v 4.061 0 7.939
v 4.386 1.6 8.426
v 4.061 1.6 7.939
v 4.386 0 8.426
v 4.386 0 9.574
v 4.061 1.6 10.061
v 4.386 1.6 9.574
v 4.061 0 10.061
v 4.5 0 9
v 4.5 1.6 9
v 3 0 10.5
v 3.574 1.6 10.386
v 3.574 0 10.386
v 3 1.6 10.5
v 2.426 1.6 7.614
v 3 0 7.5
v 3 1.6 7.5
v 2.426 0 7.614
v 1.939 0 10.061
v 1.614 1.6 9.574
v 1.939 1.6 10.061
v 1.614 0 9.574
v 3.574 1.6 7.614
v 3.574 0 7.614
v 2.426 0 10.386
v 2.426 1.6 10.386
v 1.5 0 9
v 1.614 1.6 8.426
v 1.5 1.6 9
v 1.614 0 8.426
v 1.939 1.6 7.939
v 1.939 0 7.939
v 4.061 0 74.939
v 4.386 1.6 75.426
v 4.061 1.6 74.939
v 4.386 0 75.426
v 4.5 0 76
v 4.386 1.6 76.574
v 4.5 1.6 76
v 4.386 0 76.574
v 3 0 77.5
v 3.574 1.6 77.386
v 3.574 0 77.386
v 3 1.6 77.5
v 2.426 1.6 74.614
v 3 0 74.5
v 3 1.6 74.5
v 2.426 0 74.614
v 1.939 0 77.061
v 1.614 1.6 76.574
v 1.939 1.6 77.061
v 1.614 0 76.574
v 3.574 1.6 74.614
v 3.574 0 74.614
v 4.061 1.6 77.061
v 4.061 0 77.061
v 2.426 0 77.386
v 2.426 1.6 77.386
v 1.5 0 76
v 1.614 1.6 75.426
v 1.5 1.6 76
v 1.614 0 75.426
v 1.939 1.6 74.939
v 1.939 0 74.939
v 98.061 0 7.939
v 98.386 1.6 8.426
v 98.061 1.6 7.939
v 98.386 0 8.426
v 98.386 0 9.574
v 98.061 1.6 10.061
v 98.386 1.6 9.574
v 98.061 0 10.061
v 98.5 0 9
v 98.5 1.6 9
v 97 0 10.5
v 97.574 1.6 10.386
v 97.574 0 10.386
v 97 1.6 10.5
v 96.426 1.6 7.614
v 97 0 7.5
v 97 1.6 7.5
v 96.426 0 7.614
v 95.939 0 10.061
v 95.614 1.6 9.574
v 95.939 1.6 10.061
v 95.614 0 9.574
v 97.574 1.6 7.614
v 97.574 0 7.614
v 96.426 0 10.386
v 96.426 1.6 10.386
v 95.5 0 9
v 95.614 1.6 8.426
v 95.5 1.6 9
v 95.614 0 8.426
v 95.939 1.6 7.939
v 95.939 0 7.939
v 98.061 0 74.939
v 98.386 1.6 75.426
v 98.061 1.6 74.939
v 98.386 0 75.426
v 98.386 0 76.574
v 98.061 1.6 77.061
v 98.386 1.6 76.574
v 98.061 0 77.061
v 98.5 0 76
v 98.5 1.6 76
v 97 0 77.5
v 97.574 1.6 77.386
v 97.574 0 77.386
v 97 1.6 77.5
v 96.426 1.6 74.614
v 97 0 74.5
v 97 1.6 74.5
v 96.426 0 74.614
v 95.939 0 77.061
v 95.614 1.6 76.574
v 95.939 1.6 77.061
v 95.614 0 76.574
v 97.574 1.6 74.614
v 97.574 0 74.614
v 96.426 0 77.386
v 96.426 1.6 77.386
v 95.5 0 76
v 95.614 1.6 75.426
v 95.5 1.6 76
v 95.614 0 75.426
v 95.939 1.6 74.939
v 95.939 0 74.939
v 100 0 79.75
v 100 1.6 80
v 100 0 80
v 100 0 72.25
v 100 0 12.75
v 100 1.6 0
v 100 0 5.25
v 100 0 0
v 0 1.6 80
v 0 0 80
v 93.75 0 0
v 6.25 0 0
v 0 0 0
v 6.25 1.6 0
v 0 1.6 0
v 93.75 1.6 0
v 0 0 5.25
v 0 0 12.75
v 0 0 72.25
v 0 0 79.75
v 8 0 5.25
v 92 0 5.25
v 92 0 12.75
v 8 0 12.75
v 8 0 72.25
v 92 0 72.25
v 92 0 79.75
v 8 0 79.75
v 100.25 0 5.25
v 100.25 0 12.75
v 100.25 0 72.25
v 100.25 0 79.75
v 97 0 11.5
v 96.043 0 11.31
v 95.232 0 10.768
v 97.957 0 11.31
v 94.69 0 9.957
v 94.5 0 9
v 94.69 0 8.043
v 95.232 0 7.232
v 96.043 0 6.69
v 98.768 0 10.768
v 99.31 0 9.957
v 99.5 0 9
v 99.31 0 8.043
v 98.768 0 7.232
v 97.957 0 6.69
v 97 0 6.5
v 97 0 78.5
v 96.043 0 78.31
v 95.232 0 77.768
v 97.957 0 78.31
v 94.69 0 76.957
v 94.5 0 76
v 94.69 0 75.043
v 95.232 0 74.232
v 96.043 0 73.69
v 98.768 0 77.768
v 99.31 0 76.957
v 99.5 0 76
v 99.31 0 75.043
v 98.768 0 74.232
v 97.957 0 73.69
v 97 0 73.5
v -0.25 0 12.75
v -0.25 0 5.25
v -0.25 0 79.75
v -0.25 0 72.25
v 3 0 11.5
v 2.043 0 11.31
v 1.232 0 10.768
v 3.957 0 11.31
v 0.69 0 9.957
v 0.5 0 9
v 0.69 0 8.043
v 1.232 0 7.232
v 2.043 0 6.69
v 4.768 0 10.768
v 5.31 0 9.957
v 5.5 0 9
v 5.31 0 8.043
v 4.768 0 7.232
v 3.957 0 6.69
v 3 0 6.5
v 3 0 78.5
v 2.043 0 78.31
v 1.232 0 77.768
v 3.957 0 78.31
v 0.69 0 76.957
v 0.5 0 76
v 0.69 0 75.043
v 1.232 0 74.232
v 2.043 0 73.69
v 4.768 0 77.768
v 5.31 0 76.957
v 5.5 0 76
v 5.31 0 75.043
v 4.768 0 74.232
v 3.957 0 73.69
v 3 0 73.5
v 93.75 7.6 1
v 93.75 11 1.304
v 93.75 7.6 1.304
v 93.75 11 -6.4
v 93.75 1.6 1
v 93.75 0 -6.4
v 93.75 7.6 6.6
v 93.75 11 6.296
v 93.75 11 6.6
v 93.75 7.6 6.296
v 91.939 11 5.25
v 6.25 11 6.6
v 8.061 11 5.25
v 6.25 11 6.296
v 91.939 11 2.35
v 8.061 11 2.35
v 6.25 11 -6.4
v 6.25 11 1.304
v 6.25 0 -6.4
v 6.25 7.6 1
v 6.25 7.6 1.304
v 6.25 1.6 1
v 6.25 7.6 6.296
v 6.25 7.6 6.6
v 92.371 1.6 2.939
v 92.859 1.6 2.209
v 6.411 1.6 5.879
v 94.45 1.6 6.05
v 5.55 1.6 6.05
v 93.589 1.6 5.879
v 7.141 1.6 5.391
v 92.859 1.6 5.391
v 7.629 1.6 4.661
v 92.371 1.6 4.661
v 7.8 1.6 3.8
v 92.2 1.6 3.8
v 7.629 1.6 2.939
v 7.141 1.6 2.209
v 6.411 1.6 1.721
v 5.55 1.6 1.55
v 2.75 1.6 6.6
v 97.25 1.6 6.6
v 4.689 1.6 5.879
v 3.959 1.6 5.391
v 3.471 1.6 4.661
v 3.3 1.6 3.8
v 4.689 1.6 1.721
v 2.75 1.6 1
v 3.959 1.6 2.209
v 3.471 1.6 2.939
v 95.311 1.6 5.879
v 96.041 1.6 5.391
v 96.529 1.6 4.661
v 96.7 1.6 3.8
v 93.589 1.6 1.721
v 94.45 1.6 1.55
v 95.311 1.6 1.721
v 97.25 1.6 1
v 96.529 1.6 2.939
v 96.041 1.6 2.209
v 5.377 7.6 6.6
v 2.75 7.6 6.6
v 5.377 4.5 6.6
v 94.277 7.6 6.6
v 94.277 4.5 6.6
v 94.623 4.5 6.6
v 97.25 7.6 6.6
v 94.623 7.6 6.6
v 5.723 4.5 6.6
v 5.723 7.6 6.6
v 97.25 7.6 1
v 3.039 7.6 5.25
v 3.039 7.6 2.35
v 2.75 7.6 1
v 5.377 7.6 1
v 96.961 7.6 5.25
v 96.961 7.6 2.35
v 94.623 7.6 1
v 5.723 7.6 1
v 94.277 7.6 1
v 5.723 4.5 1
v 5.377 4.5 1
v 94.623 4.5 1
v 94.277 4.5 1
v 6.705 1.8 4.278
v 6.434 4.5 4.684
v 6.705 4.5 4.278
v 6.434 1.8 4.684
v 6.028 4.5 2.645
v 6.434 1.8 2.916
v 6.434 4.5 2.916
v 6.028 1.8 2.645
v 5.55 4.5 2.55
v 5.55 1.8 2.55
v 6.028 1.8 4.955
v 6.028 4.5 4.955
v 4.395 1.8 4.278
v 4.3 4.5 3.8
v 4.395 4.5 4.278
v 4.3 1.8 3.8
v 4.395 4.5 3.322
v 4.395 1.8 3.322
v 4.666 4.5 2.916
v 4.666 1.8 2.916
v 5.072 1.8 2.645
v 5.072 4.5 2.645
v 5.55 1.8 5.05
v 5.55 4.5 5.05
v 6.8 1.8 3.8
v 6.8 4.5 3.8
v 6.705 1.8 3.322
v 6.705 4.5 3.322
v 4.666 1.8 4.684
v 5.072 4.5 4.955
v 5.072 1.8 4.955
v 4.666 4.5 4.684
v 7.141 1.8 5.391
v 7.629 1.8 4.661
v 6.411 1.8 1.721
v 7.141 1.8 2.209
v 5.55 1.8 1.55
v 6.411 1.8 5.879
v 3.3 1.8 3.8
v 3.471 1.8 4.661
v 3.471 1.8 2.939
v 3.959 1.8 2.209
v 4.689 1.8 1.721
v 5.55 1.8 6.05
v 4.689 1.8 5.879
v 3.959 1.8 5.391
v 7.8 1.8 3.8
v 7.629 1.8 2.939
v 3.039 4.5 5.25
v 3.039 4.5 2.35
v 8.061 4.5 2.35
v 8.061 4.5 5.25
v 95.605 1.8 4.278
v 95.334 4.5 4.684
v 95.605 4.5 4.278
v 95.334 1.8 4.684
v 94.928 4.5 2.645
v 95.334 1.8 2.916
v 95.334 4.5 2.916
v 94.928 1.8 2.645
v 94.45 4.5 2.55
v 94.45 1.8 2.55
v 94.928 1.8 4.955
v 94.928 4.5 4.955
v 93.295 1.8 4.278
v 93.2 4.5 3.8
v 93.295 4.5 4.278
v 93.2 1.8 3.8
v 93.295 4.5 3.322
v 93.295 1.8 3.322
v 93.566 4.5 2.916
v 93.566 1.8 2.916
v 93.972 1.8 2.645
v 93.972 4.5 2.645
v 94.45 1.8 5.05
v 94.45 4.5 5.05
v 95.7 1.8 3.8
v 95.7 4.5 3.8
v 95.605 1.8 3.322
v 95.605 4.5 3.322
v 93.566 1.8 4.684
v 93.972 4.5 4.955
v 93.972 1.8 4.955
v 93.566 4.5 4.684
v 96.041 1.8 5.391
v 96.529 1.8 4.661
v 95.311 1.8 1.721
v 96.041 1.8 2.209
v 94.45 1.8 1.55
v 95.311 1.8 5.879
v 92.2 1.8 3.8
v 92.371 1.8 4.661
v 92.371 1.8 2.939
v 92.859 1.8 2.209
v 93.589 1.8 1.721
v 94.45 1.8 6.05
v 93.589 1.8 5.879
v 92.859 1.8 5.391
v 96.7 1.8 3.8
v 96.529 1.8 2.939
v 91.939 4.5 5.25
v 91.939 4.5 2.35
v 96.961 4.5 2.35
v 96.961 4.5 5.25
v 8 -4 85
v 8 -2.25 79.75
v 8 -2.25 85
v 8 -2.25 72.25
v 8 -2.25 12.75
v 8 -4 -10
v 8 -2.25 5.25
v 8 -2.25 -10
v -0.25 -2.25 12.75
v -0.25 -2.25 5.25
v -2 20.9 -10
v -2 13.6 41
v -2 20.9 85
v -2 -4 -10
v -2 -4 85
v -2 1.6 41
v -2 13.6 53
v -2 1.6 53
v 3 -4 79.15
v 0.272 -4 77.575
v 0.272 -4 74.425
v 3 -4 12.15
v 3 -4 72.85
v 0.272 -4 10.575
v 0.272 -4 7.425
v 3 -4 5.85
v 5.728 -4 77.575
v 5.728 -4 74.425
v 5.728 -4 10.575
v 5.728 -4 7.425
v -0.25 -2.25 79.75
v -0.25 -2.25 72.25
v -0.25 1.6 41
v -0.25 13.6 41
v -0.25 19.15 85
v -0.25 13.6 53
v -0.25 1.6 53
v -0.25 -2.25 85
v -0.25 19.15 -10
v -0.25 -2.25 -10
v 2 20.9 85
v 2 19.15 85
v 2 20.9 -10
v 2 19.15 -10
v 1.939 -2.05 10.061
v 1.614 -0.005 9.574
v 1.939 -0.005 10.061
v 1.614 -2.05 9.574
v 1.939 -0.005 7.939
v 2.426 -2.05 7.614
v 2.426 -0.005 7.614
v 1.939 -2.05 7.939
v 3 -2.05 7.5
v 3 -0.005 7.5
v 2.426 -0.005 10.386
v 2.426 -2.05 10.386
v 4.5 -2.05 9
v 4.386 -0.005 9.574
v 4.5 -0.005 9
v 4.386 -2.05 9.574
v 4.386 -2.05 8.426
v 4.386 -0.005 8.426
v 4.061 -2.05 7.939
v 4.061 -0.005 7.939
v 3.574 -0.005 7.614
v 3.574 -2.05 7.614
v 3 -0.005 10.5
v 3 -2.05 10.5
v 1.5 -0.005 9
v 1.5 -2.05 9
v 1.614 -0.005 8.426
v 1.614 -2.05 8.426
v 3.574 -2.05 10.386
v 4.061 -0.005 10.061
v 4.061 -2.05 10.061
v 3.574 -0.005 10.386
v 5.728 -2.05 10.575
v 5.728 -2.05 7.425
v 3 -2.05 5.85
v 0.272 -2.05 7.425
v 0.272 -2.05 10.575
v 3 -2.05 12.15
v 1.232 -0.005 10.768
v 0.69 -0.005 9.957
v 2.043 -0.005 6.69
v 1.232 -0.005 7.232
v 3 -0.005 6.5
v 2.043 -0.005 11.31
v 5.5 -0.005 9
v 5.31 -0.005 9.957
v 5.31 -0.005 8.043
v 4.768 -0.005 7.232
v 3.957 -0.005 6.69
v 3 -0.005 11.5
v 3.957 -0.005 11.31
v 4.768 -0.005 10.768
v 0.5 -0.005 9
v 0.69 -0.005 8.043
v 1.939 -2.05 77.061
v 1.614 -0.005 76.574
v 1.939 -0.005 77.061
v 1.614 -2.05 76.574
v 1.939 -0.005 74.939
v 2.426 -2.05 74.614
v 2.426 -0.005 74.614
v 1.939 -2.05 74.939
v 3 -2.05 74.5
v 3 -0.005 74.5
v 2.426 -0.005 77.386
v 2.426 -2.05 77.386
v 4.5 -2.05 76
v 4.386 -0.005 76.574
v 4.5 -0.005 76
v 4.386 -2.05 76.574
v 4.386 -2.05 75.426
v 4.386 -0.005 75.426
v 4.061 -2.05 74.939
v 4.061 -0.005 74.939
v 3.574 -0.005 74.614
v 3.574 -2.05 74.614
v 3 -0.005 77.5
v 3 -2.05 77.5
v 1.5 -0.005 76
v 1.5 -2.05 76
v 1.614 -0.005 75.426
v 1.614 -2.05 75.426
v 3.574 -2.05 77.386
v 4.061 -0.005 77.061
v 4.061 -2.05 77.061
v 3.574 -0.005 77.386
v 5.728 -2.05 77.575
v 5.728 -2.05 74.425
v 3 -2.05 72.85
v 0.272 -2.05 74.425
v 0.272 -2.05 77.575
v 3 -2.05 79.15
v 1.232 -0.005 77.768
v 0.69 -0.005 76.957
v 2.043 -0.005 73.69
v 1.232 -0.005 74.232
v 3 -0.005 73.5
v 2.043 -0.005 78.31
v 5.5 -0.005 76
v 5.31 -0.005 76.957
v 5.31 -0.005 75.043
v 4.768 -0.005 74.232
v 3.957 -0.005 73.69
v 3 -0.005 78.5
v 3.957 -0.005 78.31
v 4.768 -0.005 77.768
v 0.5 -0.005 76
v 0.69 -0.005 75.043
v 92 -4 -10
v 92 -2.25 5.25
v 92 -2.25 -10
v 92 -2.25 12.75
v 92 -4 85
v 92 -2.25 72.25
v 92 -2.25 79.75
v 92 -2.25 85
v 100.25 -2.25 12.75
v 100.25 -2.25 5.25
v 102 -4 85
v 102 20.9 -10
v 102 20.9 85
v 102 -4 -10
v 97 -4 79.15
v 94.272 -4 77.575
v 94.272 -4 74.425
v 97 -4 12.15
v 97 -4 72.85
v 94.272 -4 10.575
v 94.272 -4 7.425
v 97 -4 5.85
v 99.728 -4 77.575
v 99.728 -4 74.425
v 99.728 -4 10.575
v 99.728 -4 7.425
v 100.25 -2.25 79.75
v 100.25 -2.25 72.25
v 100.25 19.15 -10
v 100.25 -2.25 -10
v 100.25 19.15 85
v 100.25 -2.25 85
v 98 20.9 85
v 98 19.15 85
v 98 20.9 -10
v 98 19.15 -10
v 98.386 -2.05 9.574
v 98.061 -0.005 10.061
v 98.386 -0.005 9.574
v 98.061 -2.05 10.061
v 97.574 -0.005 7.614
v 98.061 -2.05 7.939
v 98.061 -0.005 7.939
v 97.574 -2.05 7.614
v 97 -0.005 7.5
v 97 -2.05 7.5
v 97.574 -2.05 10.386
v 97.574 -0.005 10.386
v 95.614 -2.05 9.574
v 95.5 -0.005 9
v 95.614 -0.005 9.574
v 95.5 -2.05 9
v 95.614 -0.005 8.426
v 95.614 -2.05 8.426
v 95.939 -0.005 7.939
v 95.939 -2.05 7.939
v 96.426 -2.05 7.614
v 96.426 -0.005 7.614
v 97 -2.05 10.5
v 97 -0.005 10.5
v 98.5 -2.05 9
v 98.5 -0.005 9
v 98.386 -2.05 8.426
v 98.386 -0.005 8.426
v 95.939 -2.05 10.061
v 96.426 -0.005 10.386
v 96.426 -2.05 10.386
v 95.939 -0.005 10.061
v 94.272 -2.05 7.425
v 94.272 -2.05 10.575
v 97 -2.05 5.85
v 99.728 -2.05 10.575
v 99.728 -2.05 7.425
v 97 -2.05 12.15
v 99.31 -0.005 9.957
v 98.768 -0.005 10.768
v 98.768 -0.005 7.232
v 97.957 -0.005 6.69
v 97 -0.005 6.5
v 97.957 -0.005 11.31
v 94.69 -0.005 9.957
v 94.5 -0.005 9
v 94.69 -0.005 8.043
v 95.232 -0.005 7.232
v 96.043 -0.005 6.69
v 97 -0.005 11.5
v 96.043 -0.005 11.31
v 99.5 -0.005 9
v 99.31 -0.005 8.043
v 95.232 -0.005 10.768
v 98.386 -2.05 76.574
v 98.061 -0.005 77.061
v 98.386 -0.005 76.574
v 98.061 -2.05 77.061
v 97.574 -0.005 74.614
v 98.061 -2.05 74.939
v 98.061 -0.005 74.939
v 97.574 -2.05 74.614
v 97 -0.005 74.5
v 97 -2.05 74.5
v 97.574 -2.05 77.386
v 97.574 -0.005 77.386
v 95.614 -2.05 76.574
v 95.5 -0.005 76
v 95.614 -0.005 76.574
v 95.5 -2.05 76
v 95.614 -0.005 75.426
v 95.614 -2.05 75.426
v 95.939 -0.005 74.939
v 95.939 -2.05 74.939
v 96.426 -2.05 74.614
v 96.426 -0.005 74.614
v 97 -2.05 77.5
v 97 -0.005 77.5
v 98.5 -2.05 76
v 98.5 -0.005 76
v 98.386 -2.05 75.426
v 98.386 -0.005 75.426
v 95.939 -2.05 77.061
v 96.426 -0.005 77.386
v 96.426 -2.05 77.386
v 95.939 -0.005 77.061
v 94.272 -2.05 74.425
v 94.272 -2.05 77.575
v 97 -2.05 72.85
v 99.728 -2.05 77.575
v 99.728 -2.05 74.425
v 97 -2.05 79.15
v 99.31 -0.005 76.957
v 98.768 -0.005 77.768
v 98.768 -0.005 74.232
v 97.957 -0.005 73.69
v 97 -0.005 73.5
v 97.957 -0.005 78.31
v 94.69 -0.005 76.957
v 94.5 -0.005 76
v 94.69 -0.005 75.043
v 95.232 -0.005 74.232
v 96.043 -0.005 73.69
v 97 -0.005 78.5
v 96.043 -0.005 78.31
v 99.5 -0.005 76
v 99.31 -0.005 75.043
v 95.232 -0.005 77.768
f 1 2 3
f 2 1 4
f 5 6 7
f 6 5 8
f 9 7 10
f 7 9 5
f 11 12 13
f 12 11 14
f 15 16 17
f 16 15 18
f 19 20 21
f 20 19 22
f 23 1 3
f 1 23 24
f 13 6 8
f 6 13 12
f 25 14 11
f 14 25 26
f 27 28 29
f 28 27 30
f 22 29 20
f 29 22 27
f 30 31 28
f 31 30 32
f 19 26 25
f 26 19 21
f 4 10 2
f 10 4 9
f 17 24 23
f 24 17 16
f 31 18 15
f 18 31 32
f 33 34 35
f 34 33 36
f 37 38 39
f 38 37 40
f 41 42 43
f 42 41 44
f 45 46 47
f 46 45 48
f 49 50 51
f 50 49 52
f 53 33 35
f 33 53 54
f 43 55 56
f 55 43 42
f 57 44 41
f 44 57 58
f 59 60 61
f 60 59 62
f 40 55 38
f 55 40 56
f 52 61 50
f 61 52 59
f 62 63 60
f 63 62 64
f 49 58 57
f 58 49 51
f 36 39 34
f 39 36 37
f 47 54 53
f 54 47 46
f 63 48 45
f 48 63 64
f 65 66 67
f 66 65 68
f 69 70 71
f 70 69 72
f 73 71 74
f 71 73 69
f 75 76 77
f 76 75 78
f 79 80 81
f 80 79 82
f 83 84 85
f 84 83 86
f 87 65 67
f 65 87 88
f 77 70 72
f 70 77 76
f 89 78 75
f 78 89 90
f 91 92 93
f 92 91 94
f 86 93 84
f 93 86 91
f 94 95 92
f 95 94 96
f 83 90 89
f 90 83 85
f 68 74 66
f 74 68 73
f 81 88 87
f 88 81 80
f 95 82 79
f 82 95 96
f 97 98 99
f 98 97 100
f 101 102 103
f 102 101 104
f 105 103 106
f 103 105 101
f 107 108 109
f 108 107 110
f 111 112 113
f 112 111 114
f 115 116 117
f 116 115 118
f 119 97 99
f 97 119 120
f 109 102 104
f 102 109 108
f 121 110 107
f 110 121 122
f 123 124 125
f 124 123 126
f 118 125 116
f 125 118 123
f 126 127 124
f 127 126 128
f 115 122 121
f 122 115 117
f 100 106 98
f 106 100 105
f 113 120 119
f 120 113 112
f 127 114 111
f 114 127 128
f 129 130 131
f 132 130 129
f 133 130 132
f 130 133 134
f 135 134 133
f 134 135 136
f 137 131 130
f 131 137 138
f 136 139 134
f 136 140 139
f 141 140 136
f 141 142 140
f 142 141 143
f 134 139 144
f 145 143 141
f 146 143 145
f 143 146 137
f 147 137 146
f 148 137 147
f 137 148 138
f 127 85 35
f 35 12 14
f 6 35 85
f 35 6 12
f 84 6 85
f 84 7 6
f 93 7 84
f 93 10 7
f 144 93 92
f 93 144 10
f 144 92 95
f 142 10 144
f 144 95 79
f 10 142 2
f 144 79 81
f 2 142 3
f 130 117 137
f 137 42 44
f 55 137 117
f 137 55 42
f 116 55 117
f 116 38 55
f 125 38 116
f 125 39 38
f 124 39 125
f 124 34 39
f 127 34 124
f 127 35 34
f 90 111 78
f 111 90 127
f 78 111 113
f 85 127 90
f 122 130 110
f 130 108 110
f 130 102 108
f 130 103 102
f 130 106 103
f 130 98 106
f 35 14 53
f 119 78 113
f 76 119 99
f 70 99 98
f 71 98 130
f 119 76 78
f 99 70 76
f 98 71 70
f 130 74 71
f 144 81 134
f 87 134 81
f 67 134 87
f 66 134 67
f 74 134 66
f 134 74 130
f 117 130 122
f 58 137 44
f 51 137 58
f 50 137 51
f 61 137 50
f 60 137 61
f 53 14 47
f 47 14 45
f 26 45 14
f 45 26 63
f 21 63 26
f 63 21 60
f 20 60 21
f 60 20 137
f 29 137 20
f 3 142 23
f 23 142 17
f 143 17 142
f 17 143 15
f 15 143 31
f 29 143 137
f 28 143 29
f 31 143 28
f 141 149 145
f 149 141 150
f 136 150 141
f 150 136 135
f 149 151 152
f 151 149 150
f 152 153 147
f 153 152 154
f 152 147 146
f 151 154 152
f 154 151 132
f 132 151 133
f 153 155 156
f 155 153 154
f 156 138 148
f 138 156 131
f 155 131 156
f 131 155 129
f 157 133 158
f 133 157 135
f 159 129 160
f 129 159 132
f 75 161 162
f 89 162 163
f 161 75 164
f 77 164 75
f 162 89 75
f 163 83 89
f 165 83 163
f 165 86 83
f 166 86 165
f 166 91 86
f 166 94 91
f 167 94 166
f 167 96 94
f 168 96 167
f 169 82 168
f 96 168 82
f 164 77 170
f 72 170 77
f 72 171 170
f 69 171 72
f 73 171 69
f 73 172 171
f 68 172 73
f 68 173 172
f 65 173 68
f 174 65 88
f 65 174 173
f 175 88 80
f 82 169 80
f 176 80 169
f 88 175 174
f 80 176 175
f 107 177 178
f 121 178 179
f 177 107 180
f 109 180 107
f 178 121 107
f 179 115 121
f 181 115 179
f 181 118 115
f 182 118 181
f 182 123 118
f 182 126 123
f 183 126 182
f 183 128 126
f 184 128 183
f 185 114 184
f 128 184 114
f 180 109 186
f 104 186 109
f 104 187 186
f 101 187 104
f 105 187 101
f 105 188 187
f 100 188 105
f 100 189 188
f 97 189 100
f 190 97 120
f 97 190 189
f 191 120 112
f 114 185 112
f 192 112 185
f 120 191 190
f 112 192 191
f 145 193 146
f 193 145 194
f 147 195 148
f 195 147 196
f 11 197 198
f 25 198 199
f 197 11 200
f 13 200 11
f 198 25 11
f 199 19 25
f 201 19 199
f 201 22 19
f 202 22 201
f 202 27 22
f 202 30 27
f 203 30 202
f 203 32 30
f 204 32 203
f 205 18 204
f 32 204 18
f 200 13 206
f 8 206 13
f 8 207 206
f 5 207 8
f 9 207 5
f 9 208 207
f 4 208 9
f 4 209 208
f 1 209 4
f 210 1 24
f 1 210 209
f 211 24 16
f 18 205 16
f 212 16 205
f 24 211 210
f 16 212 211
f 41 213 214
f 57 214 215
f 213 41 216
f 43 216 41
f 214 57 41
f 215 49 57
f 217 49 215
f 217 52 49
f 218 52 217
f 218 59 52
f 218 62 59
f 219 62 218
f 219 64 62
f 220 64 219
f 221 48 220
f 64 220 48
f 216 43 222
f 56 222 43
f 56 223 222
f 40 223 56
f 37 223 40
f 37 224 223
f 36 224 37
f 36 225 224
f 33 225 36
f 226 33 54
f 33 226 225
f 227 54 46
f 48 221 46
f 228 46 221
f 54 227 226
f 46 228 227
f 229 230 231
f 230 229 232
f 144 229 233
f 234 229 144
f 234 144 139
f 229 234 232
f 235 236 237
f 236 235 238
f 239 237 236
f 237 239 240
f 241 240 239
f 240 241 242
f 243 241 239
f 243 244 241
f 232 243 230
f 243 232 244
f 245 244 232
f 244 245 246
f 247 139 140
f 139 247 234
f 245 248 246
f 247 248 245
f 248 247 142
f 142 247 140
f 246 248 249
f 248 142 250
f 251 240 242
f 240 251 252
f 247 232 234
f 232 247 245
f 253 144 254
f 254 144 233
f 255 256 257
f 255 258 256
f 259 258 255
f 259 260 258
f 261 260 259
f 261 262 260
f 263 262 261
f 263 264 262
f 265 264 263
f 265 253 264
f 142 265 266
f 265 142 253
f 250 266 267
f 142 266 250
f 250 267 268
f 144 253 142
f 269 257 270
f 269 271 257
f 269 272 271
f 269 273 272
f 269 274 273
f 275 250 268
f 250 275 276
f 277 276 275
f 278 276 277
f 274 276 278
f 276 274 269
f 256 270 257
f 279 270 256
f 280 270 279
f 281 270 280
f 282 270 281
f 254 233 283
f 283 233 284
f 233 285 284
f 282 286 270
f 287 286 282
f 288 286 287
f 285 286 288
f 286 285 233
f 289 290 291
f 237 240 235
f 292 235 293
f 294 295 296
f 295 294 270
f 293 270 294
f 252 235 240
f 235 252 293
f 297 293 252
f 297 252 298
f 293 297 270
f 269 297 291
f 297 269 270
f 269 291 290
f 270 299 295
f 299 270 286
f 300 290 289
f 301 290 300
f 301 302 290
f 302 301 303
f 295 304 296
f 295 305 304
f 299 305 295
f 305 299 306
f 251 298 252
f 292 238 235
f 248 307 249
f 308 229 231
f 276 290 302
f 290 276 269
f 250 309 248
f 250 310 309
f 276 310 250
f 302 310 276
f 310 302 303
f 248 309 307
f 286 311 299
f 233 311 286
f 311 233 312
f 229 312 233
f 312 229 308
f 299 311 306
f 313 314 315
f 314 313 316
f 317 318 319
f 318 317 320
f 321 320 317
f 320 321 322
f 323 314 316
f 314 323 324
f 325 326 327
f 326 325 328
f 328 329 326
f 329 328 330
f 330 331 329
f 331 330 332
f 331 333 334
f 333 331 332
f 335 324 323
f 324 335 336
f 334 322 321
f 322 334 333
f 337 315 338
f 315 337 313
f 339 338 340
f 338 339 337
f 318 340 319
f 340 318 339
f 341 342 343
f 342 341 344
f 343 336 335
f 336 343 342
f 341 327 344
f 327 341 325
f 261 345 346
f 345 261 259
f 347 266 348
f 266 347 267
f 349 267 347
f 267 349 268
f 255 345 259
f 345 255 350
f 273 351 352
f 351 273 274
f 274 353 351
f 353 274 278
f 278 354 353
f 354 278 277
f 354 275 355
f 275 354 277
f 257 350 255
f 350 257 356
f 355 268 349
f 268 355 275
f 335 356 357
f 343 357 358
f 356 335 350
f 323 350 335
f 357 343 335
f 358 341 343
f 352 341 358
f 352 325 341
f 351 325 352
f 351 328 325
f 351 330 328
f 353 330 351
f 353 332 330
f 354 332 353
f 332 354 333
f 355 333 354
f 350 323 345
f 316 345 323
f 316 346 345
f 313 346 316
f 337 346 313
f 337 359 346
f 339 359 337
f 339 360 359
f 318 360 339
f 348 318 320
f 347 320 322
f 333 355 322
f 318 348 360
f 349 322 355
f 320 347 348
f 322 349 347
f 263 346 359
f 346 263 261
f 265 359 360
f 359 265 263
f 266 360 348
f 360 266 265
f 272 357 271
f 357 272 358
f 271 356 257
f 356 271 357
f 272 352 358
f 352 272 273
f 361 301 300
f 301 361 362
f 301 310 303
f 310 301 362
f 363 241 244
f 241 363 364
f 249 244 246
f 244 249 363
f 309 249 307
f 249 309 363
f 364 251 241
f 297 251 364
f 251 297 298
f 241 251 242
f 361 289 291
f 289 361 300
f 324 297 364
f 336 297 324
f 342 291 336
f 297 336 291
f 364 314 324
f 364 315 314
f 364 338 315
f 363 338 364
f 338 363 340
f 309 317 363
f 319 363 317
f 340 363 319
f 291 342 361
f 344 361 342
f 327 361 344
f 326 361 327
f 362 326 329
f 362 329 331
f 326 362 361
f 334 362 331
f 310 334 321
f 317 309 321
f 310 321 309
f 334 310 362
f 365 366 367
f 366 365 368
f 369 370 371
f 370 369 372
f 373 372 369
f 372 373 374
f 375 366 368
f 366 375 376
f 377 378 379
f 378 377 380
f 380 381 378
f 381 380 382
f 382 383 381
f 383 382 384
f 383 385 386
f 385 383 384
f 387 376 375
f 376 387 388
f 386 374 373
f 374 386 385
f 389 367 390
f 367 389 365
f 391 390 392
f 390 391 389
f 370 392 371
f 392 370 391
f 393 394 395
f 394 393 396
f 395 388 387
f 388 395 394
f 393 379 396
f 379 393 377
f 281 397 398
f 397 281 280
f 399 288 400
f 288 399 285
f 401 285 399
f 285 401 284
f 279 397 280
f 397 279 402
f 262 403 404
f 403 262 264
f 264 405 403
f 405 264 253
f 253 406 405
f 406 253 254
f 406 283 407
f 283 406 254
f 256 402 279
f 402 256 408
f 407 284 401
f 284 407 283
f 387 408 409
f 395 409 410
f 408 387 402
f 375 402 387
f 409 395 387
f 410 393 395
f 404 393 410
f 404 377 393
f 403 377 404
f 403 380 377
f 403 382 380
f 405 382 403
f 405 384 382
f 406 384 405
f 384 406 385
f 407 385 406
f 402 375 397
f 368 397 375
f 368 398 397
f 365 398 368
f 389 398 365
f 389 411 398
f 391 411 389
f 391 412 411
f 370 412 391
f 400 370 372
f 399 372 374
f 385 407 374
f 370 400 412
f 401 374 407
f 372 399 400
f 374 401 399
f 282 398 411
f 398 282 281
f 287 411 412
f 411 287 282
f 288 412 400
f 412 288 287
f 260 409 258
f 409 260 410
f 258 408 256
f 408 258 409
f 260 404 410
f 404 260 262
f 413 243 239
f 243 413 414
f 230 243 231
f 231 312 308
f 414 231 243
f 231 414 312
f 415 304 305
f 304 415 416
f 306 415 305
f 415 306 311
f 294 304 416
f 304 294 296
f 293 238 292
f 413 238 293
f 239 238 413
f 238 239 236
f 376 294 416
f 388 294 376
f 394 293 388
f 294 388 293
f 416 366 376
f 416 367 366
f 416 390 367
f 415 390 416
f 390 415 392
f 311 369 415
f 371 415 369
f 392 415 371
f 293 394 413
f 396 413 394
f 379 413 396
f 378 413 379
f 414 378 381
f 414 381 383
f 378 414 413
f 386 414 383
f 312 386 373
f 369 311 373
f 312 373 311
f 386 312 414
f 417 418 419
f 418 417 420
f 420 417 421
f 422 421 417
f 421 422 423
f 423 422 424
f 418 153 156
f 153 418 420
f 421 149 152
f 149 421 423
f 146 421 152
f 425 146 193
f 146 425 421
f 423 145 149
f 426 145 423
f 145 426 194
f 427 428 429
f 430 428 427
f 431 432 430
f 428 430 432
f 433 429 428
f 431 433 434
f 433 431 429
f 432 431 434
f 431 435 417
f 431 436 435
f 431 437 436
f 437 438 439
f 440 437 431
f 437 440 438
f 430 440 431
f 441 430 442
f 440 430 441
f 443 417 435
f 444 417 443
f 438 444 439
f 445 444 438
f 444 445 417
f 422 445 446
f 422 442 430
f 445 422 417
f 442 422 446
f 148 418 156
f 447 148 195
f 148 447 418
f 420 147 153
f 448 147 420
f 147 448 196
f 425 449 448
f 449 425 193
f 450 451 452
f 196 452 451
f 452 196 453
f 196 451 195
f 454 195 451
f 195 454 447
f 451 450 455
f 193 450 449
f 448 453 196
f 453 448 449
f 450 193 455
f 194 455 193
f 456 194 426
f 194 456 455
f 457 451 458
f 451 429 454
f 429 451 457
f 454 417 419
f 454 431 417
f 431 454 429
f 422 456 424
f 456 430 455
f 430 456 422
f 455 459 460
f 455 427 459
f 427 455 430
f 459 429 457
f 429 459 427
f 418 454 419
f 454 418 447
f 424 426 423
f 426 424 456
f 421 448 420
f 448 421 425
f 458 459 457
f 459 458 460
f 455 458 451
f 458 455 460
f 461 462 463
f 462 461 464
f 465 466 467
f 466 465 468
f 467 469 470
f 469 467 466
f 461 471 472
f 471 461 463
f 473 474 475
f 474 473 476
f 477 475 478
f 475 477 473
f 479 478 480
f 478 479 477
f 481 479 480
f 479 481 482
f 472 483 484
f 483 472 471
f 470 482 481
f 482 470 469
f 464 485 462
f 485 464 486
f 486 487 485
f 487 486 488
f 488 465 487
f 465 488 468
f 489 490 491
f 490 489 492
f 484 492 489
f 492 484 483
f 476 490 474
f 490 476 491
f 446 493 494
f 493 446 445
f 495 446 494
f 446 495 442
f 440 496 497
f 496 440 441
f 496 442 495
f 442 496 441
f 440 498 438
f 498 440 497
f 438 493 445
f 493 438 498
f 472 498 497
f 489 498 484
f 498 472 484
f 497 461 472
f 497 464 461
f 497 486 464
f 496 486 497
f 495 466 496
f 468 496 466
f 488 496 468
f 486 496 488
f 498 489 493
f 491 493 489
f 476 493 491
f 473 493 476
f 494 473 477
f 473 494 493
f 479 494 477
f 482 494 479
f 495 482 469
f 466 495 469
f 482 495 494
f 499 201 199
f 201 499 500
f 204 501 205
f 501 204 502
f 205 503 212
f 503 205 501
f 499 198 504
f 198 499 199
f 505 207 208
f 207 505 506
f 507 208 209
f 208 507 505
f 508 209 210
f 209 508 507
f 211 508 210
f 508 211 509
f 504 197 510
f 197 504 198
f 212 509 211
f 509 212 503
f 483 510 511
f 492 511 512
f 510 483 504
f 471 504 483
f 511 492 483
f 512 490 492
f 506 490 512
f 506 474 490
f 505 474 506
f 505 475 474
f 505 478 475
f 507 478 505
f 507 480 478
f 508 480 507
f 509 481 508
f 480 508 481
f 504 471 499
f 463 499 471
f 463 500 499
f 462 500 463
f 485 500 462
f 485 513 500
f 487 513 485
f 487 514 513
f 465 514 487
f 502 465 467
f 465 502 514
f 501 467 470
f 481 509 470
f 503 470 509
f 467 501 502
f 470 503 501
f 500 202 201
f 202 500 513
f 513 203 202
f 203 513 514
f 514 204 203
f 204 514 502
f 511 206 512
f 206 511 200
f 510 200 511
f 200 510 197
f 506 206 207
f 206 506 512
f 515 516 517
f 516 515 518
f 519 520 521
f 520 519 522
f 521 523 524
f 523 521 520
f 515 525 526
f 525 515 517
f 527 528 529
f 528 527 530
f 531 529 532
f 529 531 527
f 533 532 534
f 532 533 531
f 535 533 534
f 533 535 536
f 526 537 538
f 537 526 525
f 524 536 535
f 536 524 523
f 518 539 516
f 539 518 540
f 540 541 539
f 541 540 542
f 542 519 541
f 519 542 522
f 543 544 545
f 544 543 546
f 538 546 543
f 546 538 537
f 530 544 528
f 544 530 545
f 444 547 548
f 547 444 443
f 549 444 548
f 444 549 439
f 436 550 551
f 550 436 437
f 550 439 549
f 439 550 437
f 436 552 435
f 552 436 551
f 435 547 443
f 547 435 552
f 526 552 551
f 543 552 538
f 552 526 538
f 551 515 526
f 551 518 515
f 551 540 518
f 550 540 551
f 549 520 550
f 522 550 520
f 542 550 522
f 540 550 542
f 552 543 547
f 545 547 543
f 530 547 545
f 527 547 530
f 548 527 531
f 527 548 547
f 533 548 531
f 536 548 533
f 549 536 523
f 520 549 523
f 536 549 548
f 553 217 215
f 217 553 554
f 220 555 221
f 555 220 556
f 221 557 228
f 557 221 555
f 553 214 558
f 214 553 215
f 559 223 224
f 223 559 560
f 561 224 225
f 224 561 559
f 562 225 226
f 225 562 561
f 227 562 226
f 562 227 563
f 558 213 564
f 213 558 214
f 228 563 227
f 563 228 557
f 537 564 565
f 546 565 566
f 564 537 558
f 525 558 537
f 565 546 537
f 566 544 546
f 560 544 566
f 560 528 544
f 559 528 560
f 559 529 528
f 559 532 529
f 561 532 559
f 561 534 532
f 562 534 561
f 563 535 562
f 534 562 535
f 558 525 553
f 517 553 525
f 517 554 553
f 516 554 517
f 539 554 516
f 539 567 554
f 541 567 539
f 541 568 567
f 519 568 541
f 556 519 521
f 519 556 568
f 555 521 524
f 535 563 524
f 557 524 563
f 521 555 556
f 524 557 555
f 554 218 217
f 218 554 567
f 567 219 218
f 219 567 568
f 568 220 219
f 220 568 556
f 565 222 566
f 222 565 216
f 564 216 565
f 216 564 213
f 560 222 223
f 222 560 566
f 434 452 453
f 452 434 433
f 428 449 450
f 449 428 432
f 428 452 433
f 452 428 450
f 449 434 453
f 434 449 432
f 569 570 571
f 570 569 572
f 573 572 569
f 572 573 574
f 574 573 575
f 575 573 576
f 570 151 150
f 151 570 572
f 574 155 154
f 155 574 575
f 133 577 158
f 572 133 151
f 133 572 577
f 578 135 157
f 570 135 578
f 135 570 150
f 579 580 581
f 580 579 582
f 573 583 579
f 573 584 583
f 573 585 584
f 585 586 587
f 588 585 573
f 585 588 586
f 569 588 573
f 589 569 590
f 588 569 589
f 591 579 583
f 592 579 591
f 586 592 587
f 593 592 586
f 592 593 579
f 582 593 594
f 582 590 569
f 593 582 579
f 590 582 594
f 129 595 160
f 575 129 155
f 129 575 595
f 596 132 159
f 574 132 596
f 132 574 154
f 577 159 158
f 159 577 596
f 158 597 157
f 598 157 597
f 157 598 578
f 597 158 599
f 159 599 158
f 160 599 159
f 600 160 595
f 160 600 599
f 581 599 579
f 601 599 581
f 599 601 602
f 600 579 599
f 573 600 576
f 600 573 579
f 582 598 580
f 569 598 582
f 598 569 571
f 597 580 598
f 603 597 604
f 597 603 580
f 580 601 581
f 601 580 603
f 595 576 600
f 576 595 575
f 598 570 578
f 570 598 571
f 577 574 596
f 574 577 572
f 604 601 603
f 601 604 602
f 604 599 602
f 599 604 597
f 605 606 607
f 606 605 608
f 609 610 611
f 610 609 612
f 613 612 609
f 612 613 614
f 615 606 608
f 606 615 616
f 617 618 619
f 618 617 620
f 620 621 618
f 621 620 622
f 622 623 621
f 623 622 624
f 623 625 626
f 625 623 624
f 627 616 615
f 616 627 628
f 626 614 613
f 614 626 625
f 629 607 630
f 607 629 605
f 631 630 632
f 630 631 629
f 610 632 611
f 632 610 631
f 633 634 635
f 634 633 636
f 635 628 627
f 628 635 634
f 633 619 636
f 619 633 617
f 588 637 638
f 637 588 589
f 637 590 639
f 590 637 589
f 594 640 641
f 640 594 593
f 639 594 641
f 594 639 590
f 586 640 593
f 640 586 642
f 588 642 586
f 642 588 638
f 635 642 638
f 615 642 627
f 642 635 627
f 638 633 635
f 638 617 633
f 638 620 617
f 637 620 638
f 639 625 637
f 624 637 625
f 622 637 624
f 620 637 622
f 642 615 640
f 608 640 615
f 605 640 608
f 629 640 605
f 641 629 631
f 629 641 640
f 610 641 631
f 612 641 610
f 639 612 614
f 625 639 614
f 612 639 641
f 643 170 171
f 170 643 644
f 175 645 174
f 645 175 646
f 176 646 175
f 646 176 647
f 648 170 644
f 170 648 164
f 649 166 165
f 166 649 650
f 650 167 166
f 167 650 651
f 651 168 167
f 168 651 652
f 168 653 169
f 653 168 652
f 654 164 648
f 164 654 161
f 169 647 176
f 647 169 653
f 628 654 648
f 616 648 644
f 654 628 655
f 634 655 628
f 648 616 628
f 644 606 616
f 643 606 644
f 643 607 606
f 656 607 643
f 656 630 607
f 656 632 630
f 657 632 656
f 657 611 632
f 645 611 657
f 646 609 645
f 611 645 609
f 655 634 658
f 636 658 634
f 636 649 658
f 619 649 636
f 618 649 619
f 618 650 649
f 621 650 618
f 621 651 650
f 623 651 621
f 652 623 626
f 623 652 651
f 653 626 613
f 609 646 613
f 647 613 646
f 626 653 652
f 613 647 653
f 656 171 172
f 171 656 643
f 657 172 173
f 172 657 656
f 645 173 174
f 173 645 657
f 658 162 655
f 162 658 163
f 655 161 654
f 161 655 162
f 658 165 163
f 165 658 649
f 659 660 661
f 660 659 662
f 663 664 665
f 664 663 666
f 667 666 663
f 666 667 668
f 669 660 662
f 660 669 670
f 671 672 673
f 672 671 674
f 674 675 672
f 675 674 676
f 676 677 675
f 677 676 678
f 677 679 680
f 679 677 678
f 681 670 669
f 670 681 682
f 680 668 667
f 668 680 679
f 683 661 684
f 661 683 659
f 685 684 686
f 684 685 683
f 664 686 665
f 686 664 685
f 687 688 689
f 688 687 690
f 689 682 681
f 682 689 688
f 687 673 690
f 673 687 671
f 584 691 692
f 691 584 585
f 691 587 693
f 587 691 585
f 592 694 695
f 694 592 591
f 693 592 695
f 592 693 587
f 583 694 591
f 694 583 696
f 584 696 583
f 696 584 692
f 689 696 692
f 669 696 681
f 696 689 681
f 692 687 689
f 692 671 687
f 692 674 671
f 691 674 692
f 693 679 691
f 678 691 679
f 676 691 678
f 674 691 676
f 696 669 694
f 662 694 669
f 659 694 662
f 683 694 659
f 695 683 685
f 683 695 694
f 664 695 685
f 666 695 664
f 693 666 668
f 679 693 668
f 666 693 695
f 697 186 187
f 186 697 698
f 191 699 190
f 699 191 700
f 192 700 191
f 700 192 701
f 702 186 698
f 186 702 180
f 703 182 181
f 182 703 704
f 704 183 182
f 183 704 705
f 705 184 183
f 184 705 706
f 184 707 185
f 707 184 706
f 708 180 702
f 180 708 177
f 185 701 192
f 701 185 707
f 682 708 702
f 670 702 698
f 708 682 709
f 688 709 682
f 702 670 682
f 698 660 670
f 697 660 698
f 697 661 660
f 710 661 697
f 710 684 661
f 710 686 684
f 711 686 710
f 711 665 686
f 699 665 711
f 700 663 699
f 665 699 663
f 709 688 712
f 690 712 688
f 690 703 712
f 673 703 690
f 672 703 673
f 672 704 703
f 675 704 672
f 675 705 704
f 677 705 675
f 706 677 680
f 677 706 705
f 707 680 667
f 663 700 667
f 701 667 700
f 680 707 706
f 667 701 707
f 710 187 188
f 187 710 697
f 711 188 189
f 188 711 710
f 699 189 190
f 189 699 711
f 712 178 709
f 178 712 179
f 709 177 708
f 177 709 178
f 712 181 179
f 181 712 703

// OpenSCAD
// file: ../library/din41612/din41612_male.scad
// din41612 male connector
// =======================

include <din41612_male_dim.scad>

use <../linurs/linurs_screw.scad>

module din41612_male(){ 
  // color("LightGrey")
  difference(){
    union(){
        translate([0,din41612_male_w1/2,din41612_male_h/2-din41612_male_h1])  
        cube([din41612_male_l1,
              din41612_male_w1,
              din41612_male_h],
             center=true);  
      translate([0,(din41612_male_w1-din41612_male_w)/2,(din41612_male_h-din41612_male_h1)/2]) 
        cube([din41612_male_l1,
              (din41612_male_w-din41612_male_w1),
              din41612_male_h-din41612_male_h1],
             center=true);  
      translate([0,din41612_male_w2/2+din41612_male_w1-din41612_male_w,din41612_male_h2/2])
        cube([din41612_male_l,
              din41612_male_w2,
              din41612_male_h2],
             center=true);  
    }
    for(i=[-1,1]){ // mounting holes
      translate([i*din41612_male_dl/2,
                 din41612_male_w1-din41612_male_w+din41612_male_w2/2, 
                 din41612_male_h1])
      rotate([180,0,90])screw_fix(
            w=din41612_male_h2, 
            d=M2_5, 
            type=head_cyl, 
            nut_sink=din41612_male_h,
            t=0);
    }
  }
}
din41612_male();  
// file: ../library/din41612/din41612_male_dim.scad
include <../linurs/linurs_screw_dim.scad>

// connector dimensions
din41612_male_l=94.5;    // lenght of the connector
din41612_male_l1=87.5;   // 
din41612_male_w=13;      // width of the connector
din41612_male_w1=6.4;    // 
din41612_male_w2=5.6;    // 
din41612_male_h=11;      // height of the connector
din41612_male_h1=1.6;    // 
din41612_male_h2=6;      // 

din41612_male_dl=88.9;   // distance between mounting holes
// file: ../library/din41612/din41612_female_dim.scad
include <../linurs/linurs_screw_dim.scad>

// connector dimensions
din41612_female_l=95;       // lenght of the connector
din41612_female_l1=85;      // lenght of the connector head
din41612_female_h=11.6;     // height of the connector
din41612_female_h1=5.2;     // height produced by the connector when pulgged in 
din41612_female_w=11;       // width of the connector
din41612_female_w1=8.5;     // width of the connector head

din41612_female_dl=90;      // distance between mounting holes
// file: ../pcb/pcb.scad
// pcb
// ===
// The pcb is the master object and has its 
// lower left corner solder side at the origin of the 
// coordinate system 

n=2;  // [1,2,3,4,5,6,7,8]
show_pcb="assemblies"; // [assemblies,assembly,pcb]

include <pcb_dim.scad>
include <../motherboard/motherboard_dim.scad>

use <../library/din41612/din41612_male.scad>

module pcb(){
  echo("pcb");  
  color("greenyellow")
  difference(){
    cube([pcb_l,pcb_h,pcb_w]); // pcb
    for(x=[-1,1]){ // mounting holes
      for(y=[pcb_wd1,pcb_wd1+pcb_wd]){
        translate([x*pcb_ld/2+pcb_l/2,0,y])
        rotate([90,0,0])
        cylinder(d=pcb_d,h=3*pcb_h,center=true,$fn=16);
      }
    }
  }
}

module pcb_assembly(){
  echo("pcb assembly");  
  pcb();  
  translate([pcb_l/2,pcb_h,0])  
  rotate([-90,0,0])din41612_male();  
}

module pcb_assemblies(n=1){
  echo("pcb assemblies"); 
  for(i=[0:n-1]){ // add the connectors
      echo(i);
      translate([0,step*i,0])
      pcb_assembly();
  }    
}    

if(show_pcb=="assemblies"){
  pcb_assemblies(n=n);
}

if(show_pcb=="assembly"){
  pcb_assembly();
}

if(show_pcb=="pcb"){
    // Move to center to create 2D drawings from top view 
    // with script OpenSCAD22d.py
    //
    rotate([90,0,180])
    //
    translate([-pcb_l/2,-pcb_h/2,-pcb_w/2])
    pcb();
}
// file: ../bracket/bracket.scad
// bracket
// =======
// A bracket of the elecbox module
// - type: 0 front bracket, 1 rear bracket
// - width 1..n in steps

// parameters for customizer
// bracket width
n=2; // [1,2,3,4,5,6,7,8]
// type
bracket="Front"; // [Front,Back]
// intermediate mounting holes
intermediate=false;  

include <../pcb/pcb_dim.scad>

include <../motherboard/motherboard_dim.scad>
include <../library/linurs/linurs_screw_dim.scad>
include <bracket_dim.scad>

use <../library/linurs/linurs_screw.scad>
    
module back_bracket(n=1, intermediate=false){
  mirror([1,0,0])       // mirror it if desired
  front_bracket(n=n, intermediate=intermediate); 
}
    
module front_bracket(n=1, intermediate=false){
  echo("bracket");  
  //color("White")
  intermediatestep=(intermediate)?step:0; 
  difference(){
    union(){
      translate([-bracket_h2/2-bracket_gap/2,
                 bracket_w(n)/2-bracket_w1,
                 bracket_l/2])  
      cube([bracket_h2,
            bracket_w(n),
            bracket_l],center=true); // create the bracket front
  
      translate([bracket_h/2-bracket_h2-bracket_gap/2,
                 bracket_t/2-bracket_w1,
                 bracket_l/2]) 
      cube([bracket_h,
            bracket_t,
            bracket_l],center=true); // U shape side of the screw
      
      translate([bracket_h1/2-bracket_h2-bracket_gap/2,
                 bracket_w(n)-bracket_w1-bracket_t/2,
                 bracket_l/2]) 
      cube([bracket_h1,
            bracket_t,
            bracket_l],center=true); // U shape where no screw  
      for(x=[1:n]){  // create the mounting hole cubes 
        for(z=[bracket_l1,
               bracket_l1+bracket_ld]){
          translate([ bracket_h/2-bracket_h2-bracket_gap/2,
                     -bracket_w1/2+(x-1)*intermediatestep,
                     z])
          cube([bracket_h,
                bracket_w1,
                bracket_l2],center=true);
        }
      }   
    }
    for(x=[1:n]){ // create the mounting hole 
      for(z=[bracket_l1,
             bracket_l1+bracket_ld]){
        translate([bracket_h3-bracket_h2-bracket_gap/2,
                  -bracket_w1/2+(x-1)*intermediatestep,
                   z])
        rotate([0,90,0])
        rotate([-90,0,0])
        screw_fix(w=bracket_w1,d=bracket_screw,type=head_no, t=bracket_screw_gap);
      }
    }
  }
}

if(bracket=="Front"){
  front_bracket(intermediate=intermediate,n=n);
}

if(bracket=="Back"){
  back_bracket(intermediate=intermediate,n=n);
}
// file: ../library/linurs/linurs_screw.scad
// Metric screws and nuts 
// urs@linurs.org 2019
// It is targeted for 3D printing applications. 
// To look realistic is not the goal (Example: Nuts do not have a hole)

include <linurs_screw_dim.scad>

d=0; //[0:M2_5,1:M3,2:M4,3:M5]
type=0;//[0:head_cyl,1:head_cnt,2:head_no,3:head_hex]
w=15; 
i=10;
nut_sink=0;
screw_sink=0; 
t=0.01;
fn=16;

/* [hex_bolt] */
show_hex_bolt=false;

/* [nut] */
show_nut=false;

/* [screw] */
show_screw=false;

/* [screw_fix] */
show_screw_fix=false;

/* [screw_cut] */
show_screw_cut=false;

/* [nut_cut] */
show_nut_cut=false;
wi=0; 
rot=false;

// functions used multiple times to position nuts and heads
function headh_cyl(d)=screw_cyl[d][1];  // height of cyl screw head
function headh_cnt(d)=screw_cyl[d][1];  // height of cnt screw head
function headh(d,type=head_cyl)=(type==head_cyl ? headh_cyl(d) : (type==head_cnt ? headh_cnt(d) : 0 )); // height of screw head 

function nuth(d)=screw_hex[d][2];   // height of hex nut

// head of a cylinder screw
module screw_head_cyl(d=M3, t=0)
{
  screwhd=screw_cyl[d][0]+t; // diameter of cylinder screw head
  cylinder(d=screwhd,h=headh(d=d, type=head_cyl), center=true,$fn=16); // screw head
}

// head of a countersunk screw
module screw_head_cnt(d=M3, t=0)
{
  screwd=screw_d[d]+t; 
  screwhd=screw_cnt[d][0]+t; // diameter of cylinder screw head
  cylinder(d1=screwd,d2=screwhd,h=headh(d=d,type=head_cnt), center=true,$fn=16); // screw head
}

// head of a hex screw
module screw_head_hex(d=M3, t=0)
{
    translate([0,0,-nuth(d)/2])nut(d=d, t=t);
}

// head of all screws
module screw_head(d=M3, type=head_cyl, t=0)
{ 
  if(type==head_cnt){
    screw_head_cnt(d=d, t=t);
  } else {
    if(type==head_cyl){
      screw_head_cyl(d=d, t=t);
    } else {
       if(type==head_hex){
           screw_head_hex(d=d, t=t); 
       } 
    }    
  }
}

// hex bolt 
module hex_bolt(d=M3, w=10, t=0)
{
  nutd=screw_hex[d][1]+t; // outer diameter of hex bolt
  cylinder(r=nutd/2,h=w+t, center=true,$fn=6); // nut
}

// nut 
module nut(d=M3, t=0)
{
  hex_bolt(d=d, w=nuth(d), t=t);    
}

// screw 
// w outer width of the screw = screw length + head 
module screw(w=10, d=M3, type=head_cyl, t=0){
  screwd=screw_d[d]+t;       // screw diameter
  cylinder(d=screwd, h=w, center=true,$fn=16); // screw thread length
  translate([0,0,w/2-headh(d=d,type=type)/2])
  screw_head(d=d,type=type, t=t);
}

// screw fix
// w outer width of the screw = screw length + head 
// sink additional material below to remove 
// raise additional material above to remove
module screw_fix(w=10, d=M3, type=head_cyl, screw_sink=0, nut_sink=0, t=0){
  screw(w=w, d=d, type=type, t=t);
  translate([0,0,-w/2+nuth(d)/2])
    nut(d=d,t=t);
  //additional material to be removed above the nut  
  translate([0,0,-(w+nut_sink)/2])hex_bolt(d=d,w=nut_sink+0.01,t=t);    
  //additional material to be removed above the screw head
  if(type==head_cnt){  
    translate([0,0,w/2+screw_sink])
    cylinder(d=screw_cnt[d][0]+t,h=screw_sink+0.01,center=true,$fn=16);
  }else{ 
    translate([0,0,(w+screw_sink)/2])
    cylinder(d=screw_cyl[d][0]+t,h=screw_sink+0.01,center=true,$fn=16);
  }     
}

// screw cut
// material to be extracted from object to slide in a counter sunk screw for fixation
// w height of the cut out
// i depth of the screw
module screw_cut(d=M3,w=20,i=10,t=0,fn=32){
    hsh=screw_cnt[d][1];
    ws=screw_cnt[d][0]+t;
    ds=screw_d[d]+t;
    
    translate([i/2,0,-(w-hsh)/2])
      cube([i,ws,hsh],center=true);
    
    translate([0,0,-(w-hsh)/2])
      cylinder(d=ws,h=hsh,center=true,$fn=32);
    
    translate([0,0,-(w-hsh)/2+hsh])
        cylinder(d2=ds, d1=ws, h=hsh,center=true,$fn=fn);
    
    cylinder(h=w, d=ds, center=true, $fn=fn);   
    
    translate([i/2,0,0]) 
        cube([i,ds,w],center=true);
    
    for(y=[-1,1]){
        translate([i/2,y*ds/2,-w/2+hsh])
            rotate([45,0,0])
            cube([i,sqrt(2)*(ws-ds)/2,sqrt(2)*(ws-ds)/2],center=true);
    }
}
//screw_cut();

// nut cut
// material to be extracted from object to slide in a nut for fixation
// w height of the cylinder
// i lenght of the inlet
module nut_cut(w=10, wi=0, d=M3, i=10, t=0, rot=false,type=head_cyl){ 
  r=(rot)?90:0;
  ds=(rot)?screw_hex[d][1]:screw_hex[d][0];
  rotate([0,0,r])nut(d,t);
  translate([i/2,0,0])
    cube([i,ds+t,nuth(d)+t],center=true);
  translate([0,0,-wi])
      if(type==head_cnt){    
          screw(w=w, d=d, type=type, t=t); 
        translate([0,0,w/2])
          cylinder(d=screw_cnt[d][0]+t,h=raise,center=true,$fn=16);
      }
      else{ 
          screw(w=w, d=d, type=type, t=t);   
  //      translate([0,0,0])
          //#cylinder(d=screw_cyl[d][0]+t,h=w,center=true,$fn=16);
      }       
}

if(show_hex_bolt==true){
   hex_bolt(d=d, w=w, t=t);
}

if(show_nut==true){
  nut(d=d, t=t);
}    

if(show_screw==true){
   screw(w=w, d=d, type=type, t=t);
}

if(show_screw_fix==true){
  screw_fix(w=w, d=d, type=type, nut_sink=nut_sink, screw_sink=screw_sink, t=t);
}

if(show_screw_cut==true){
  screw_cut(d=d,w=w,i=i,t=t,$fn=fn);
}    

if(show_nut_cut==true){
  nut_cut(w=w, wi=wi, d=d, i=i, t=t,rot=rot,type=type);
}  
// file: ../library/linurs/linurs_screw_dim.scad
// Metric screws and nuts 
// urs@linurs.org

// contains dimensions of linurs_screw and can be included in other 
// OpenScad files 

// Parameters in this file
// d screw diameter M2_5, M3, ... (enumeration with screw_d)
// t millimeters added to diameters 

// enumerations of metric threads
M2_5=0;
M3=1;
M4=2;
M5=3;

// enumerations screw head type
head_cyl=0; // cylinder
head_cnt=1; // countrsunk
head_no=2;  // no head at all
head_hex=3;  // no head at all

// screw diameters
screw_d=[
2.5, // M2.5
3.0, // M3
4.0, // M4
5.0  // M5
];

// sizes for hex nuts
screw_hex=[
//   s,   e,   h
 [ 5.0, 5.8, 1.7], // M2.5
 [ 5.5, 6.4, 2.0], // M3
 [ 7.0, 8.1, 2.8], // M4
 [ 8.0, 9.2, 3.5]  // M5
];

// sizes for cylinder screw heads
screw_cyl=[
//   d,   h
 [ 4.5, 1.6], // M2.5
 [ 5.5, 2.0], // M3
 [ 7.0, 2.6], // M4
 [ 8.5, 3.3]  // M5
];

// sizes for countersunk screw heads
screw_cnt=[
//   d,   h
 [ 4.7, 1.50], // M2.5
 [ 5.6, 1.65], // M3
 [ 7.4, 2.20], // M4
 [ 9.2, 2.50]  // M5
];
// file: ../motherboard/motherboard_dim.scad
include <../library/linurs/linurs_screw_dim.scad>
include <../library/din41612/din41612_female_dim.scad>
include <../library/din41612/din41612_male_dim.scad>
include <../pcb/pcb_dim.scad>
// motherboard pcb dimensions
motherboard_l=pcb_l;   // pcb width
motherboard_h=1.6;     // pcb thickness
step=25.4;             // distance between modules

function motherboard_w(n)=din41612_female_w+step*(n-1);

screw_motherboard_d=M2_5;
screw_motherboard_l=16;
motherboard_pass=0.5;// gap to fit screws 

motherboard_z_offset=-din41612_male_w1-din41612_female_h1-motherboard_h;
// file: ../bracket/bracket_dim.scad
// bracket

include <../pcb/pcb_dim.scad>
include <../motherboard/motherboard_dim.scad>
include <../library/linurs/linurs_screw_dim.scad>

bracket_screw=M2_5;   // hole for the screw

bracket_gap=0.5;      // gap between bracket to make sure it fits in the box
bracket_screw_gap=0.5;// gap to fit the screw

bracket_l=pcb_w+15;   // height of bracket
bracket_l1=19;        // hole l
bracket_l2=3*screw_d[bracket_screw];
bracket_ld=pcb_wd;    // hole distance

bracket_h=10;         // depth of the U shape at the side of the screw
bracket_h1=4;         // depth of the U shape at the side where no screw is 
bracket_h2=2-bracket_gap/2;   // thickness of bracket
bracket_h3=5;         // hole h

bracket_w1=4;         // height of the mounting hole cube
bracket_tn=2;         // thickness of bracket
bracket_t=bracket_tn-bracket_gap/2;  // thickness of bracket - gap

bracket_offset_z=-10;  // bracket offset in elecbox z axis

function bracket_w(n)=step*n-bracket_gap;
function bracket_w2(n)=step*n-2*bracket_tn;
// file: ../pcb/pcb_dim.scad
// The pcb is the master object of the project
// therefore no other include files from other objects
// are necessary

// pcb constants
pcb_l =100;  // lenght of the pcb
pcb_ld = 94; // hole distance 
pcb_w=80;    // height of the pcb
pcb_wd = 67; // hole distance
pcb_wd1 = 9; // hole to edge distance 
pcb_d=3;     // diameter of holes
pcb_h=1.6;   // thickness
// main file
// ACconverterI2C module
// ============

ACconverterI2C="assembly"; // [assembly,front,back,print_front,print_back]

include <../pcb/pcb_dim.scad>
include <../bracket/bracket_dim.scad>
include <../motherboard/motherboard_dim.scad>
include <../library/linurs/linurs_screw_dim.scad>

use <../library/linurs/linurs_screw.scad>
use <../bracket/bracket.scad>
use <../pcb/pcb.scad>

module ACconverterI2C_back(){
        translate([0,0,bracket_offset_z])back_bracket(n=1);
}

module ACconverterI2C_front(){
    h1=12;
    w1=12;
    z1=41;
    difference(){
        translate([0,0,bracket_offset_z])front_bracket(n=1);
          translate([
          0,
          h1/2+pcb_h,
          z1+w1/2])
        cube([
          bracket_h,
          h1,
          w1],center=true);
    }
}

module ACconverterI2C_assembly(){
    pcb_assembly();
    ACconverterI2C_front();
    translate([pcb_l,0,0])ACconverterI2C_back();
}

if(ACconverterI2C=="front"){
  ACconverterI2C_front();
}

if(ACconverterI2C=="back"){
  ACconverterI2C_back();
}

if(ACconverterI2C=="assembly"){
  ACconverterI2C_assembly();
}

if(ACconverterI2C=="print_front"){
  rotate([0,-90,0])
    ACconverterI2C_front();
}

if(ACconverterI2C=="print_back"){
  rotate([0,90,0])ACconverterI2C_back();
}
